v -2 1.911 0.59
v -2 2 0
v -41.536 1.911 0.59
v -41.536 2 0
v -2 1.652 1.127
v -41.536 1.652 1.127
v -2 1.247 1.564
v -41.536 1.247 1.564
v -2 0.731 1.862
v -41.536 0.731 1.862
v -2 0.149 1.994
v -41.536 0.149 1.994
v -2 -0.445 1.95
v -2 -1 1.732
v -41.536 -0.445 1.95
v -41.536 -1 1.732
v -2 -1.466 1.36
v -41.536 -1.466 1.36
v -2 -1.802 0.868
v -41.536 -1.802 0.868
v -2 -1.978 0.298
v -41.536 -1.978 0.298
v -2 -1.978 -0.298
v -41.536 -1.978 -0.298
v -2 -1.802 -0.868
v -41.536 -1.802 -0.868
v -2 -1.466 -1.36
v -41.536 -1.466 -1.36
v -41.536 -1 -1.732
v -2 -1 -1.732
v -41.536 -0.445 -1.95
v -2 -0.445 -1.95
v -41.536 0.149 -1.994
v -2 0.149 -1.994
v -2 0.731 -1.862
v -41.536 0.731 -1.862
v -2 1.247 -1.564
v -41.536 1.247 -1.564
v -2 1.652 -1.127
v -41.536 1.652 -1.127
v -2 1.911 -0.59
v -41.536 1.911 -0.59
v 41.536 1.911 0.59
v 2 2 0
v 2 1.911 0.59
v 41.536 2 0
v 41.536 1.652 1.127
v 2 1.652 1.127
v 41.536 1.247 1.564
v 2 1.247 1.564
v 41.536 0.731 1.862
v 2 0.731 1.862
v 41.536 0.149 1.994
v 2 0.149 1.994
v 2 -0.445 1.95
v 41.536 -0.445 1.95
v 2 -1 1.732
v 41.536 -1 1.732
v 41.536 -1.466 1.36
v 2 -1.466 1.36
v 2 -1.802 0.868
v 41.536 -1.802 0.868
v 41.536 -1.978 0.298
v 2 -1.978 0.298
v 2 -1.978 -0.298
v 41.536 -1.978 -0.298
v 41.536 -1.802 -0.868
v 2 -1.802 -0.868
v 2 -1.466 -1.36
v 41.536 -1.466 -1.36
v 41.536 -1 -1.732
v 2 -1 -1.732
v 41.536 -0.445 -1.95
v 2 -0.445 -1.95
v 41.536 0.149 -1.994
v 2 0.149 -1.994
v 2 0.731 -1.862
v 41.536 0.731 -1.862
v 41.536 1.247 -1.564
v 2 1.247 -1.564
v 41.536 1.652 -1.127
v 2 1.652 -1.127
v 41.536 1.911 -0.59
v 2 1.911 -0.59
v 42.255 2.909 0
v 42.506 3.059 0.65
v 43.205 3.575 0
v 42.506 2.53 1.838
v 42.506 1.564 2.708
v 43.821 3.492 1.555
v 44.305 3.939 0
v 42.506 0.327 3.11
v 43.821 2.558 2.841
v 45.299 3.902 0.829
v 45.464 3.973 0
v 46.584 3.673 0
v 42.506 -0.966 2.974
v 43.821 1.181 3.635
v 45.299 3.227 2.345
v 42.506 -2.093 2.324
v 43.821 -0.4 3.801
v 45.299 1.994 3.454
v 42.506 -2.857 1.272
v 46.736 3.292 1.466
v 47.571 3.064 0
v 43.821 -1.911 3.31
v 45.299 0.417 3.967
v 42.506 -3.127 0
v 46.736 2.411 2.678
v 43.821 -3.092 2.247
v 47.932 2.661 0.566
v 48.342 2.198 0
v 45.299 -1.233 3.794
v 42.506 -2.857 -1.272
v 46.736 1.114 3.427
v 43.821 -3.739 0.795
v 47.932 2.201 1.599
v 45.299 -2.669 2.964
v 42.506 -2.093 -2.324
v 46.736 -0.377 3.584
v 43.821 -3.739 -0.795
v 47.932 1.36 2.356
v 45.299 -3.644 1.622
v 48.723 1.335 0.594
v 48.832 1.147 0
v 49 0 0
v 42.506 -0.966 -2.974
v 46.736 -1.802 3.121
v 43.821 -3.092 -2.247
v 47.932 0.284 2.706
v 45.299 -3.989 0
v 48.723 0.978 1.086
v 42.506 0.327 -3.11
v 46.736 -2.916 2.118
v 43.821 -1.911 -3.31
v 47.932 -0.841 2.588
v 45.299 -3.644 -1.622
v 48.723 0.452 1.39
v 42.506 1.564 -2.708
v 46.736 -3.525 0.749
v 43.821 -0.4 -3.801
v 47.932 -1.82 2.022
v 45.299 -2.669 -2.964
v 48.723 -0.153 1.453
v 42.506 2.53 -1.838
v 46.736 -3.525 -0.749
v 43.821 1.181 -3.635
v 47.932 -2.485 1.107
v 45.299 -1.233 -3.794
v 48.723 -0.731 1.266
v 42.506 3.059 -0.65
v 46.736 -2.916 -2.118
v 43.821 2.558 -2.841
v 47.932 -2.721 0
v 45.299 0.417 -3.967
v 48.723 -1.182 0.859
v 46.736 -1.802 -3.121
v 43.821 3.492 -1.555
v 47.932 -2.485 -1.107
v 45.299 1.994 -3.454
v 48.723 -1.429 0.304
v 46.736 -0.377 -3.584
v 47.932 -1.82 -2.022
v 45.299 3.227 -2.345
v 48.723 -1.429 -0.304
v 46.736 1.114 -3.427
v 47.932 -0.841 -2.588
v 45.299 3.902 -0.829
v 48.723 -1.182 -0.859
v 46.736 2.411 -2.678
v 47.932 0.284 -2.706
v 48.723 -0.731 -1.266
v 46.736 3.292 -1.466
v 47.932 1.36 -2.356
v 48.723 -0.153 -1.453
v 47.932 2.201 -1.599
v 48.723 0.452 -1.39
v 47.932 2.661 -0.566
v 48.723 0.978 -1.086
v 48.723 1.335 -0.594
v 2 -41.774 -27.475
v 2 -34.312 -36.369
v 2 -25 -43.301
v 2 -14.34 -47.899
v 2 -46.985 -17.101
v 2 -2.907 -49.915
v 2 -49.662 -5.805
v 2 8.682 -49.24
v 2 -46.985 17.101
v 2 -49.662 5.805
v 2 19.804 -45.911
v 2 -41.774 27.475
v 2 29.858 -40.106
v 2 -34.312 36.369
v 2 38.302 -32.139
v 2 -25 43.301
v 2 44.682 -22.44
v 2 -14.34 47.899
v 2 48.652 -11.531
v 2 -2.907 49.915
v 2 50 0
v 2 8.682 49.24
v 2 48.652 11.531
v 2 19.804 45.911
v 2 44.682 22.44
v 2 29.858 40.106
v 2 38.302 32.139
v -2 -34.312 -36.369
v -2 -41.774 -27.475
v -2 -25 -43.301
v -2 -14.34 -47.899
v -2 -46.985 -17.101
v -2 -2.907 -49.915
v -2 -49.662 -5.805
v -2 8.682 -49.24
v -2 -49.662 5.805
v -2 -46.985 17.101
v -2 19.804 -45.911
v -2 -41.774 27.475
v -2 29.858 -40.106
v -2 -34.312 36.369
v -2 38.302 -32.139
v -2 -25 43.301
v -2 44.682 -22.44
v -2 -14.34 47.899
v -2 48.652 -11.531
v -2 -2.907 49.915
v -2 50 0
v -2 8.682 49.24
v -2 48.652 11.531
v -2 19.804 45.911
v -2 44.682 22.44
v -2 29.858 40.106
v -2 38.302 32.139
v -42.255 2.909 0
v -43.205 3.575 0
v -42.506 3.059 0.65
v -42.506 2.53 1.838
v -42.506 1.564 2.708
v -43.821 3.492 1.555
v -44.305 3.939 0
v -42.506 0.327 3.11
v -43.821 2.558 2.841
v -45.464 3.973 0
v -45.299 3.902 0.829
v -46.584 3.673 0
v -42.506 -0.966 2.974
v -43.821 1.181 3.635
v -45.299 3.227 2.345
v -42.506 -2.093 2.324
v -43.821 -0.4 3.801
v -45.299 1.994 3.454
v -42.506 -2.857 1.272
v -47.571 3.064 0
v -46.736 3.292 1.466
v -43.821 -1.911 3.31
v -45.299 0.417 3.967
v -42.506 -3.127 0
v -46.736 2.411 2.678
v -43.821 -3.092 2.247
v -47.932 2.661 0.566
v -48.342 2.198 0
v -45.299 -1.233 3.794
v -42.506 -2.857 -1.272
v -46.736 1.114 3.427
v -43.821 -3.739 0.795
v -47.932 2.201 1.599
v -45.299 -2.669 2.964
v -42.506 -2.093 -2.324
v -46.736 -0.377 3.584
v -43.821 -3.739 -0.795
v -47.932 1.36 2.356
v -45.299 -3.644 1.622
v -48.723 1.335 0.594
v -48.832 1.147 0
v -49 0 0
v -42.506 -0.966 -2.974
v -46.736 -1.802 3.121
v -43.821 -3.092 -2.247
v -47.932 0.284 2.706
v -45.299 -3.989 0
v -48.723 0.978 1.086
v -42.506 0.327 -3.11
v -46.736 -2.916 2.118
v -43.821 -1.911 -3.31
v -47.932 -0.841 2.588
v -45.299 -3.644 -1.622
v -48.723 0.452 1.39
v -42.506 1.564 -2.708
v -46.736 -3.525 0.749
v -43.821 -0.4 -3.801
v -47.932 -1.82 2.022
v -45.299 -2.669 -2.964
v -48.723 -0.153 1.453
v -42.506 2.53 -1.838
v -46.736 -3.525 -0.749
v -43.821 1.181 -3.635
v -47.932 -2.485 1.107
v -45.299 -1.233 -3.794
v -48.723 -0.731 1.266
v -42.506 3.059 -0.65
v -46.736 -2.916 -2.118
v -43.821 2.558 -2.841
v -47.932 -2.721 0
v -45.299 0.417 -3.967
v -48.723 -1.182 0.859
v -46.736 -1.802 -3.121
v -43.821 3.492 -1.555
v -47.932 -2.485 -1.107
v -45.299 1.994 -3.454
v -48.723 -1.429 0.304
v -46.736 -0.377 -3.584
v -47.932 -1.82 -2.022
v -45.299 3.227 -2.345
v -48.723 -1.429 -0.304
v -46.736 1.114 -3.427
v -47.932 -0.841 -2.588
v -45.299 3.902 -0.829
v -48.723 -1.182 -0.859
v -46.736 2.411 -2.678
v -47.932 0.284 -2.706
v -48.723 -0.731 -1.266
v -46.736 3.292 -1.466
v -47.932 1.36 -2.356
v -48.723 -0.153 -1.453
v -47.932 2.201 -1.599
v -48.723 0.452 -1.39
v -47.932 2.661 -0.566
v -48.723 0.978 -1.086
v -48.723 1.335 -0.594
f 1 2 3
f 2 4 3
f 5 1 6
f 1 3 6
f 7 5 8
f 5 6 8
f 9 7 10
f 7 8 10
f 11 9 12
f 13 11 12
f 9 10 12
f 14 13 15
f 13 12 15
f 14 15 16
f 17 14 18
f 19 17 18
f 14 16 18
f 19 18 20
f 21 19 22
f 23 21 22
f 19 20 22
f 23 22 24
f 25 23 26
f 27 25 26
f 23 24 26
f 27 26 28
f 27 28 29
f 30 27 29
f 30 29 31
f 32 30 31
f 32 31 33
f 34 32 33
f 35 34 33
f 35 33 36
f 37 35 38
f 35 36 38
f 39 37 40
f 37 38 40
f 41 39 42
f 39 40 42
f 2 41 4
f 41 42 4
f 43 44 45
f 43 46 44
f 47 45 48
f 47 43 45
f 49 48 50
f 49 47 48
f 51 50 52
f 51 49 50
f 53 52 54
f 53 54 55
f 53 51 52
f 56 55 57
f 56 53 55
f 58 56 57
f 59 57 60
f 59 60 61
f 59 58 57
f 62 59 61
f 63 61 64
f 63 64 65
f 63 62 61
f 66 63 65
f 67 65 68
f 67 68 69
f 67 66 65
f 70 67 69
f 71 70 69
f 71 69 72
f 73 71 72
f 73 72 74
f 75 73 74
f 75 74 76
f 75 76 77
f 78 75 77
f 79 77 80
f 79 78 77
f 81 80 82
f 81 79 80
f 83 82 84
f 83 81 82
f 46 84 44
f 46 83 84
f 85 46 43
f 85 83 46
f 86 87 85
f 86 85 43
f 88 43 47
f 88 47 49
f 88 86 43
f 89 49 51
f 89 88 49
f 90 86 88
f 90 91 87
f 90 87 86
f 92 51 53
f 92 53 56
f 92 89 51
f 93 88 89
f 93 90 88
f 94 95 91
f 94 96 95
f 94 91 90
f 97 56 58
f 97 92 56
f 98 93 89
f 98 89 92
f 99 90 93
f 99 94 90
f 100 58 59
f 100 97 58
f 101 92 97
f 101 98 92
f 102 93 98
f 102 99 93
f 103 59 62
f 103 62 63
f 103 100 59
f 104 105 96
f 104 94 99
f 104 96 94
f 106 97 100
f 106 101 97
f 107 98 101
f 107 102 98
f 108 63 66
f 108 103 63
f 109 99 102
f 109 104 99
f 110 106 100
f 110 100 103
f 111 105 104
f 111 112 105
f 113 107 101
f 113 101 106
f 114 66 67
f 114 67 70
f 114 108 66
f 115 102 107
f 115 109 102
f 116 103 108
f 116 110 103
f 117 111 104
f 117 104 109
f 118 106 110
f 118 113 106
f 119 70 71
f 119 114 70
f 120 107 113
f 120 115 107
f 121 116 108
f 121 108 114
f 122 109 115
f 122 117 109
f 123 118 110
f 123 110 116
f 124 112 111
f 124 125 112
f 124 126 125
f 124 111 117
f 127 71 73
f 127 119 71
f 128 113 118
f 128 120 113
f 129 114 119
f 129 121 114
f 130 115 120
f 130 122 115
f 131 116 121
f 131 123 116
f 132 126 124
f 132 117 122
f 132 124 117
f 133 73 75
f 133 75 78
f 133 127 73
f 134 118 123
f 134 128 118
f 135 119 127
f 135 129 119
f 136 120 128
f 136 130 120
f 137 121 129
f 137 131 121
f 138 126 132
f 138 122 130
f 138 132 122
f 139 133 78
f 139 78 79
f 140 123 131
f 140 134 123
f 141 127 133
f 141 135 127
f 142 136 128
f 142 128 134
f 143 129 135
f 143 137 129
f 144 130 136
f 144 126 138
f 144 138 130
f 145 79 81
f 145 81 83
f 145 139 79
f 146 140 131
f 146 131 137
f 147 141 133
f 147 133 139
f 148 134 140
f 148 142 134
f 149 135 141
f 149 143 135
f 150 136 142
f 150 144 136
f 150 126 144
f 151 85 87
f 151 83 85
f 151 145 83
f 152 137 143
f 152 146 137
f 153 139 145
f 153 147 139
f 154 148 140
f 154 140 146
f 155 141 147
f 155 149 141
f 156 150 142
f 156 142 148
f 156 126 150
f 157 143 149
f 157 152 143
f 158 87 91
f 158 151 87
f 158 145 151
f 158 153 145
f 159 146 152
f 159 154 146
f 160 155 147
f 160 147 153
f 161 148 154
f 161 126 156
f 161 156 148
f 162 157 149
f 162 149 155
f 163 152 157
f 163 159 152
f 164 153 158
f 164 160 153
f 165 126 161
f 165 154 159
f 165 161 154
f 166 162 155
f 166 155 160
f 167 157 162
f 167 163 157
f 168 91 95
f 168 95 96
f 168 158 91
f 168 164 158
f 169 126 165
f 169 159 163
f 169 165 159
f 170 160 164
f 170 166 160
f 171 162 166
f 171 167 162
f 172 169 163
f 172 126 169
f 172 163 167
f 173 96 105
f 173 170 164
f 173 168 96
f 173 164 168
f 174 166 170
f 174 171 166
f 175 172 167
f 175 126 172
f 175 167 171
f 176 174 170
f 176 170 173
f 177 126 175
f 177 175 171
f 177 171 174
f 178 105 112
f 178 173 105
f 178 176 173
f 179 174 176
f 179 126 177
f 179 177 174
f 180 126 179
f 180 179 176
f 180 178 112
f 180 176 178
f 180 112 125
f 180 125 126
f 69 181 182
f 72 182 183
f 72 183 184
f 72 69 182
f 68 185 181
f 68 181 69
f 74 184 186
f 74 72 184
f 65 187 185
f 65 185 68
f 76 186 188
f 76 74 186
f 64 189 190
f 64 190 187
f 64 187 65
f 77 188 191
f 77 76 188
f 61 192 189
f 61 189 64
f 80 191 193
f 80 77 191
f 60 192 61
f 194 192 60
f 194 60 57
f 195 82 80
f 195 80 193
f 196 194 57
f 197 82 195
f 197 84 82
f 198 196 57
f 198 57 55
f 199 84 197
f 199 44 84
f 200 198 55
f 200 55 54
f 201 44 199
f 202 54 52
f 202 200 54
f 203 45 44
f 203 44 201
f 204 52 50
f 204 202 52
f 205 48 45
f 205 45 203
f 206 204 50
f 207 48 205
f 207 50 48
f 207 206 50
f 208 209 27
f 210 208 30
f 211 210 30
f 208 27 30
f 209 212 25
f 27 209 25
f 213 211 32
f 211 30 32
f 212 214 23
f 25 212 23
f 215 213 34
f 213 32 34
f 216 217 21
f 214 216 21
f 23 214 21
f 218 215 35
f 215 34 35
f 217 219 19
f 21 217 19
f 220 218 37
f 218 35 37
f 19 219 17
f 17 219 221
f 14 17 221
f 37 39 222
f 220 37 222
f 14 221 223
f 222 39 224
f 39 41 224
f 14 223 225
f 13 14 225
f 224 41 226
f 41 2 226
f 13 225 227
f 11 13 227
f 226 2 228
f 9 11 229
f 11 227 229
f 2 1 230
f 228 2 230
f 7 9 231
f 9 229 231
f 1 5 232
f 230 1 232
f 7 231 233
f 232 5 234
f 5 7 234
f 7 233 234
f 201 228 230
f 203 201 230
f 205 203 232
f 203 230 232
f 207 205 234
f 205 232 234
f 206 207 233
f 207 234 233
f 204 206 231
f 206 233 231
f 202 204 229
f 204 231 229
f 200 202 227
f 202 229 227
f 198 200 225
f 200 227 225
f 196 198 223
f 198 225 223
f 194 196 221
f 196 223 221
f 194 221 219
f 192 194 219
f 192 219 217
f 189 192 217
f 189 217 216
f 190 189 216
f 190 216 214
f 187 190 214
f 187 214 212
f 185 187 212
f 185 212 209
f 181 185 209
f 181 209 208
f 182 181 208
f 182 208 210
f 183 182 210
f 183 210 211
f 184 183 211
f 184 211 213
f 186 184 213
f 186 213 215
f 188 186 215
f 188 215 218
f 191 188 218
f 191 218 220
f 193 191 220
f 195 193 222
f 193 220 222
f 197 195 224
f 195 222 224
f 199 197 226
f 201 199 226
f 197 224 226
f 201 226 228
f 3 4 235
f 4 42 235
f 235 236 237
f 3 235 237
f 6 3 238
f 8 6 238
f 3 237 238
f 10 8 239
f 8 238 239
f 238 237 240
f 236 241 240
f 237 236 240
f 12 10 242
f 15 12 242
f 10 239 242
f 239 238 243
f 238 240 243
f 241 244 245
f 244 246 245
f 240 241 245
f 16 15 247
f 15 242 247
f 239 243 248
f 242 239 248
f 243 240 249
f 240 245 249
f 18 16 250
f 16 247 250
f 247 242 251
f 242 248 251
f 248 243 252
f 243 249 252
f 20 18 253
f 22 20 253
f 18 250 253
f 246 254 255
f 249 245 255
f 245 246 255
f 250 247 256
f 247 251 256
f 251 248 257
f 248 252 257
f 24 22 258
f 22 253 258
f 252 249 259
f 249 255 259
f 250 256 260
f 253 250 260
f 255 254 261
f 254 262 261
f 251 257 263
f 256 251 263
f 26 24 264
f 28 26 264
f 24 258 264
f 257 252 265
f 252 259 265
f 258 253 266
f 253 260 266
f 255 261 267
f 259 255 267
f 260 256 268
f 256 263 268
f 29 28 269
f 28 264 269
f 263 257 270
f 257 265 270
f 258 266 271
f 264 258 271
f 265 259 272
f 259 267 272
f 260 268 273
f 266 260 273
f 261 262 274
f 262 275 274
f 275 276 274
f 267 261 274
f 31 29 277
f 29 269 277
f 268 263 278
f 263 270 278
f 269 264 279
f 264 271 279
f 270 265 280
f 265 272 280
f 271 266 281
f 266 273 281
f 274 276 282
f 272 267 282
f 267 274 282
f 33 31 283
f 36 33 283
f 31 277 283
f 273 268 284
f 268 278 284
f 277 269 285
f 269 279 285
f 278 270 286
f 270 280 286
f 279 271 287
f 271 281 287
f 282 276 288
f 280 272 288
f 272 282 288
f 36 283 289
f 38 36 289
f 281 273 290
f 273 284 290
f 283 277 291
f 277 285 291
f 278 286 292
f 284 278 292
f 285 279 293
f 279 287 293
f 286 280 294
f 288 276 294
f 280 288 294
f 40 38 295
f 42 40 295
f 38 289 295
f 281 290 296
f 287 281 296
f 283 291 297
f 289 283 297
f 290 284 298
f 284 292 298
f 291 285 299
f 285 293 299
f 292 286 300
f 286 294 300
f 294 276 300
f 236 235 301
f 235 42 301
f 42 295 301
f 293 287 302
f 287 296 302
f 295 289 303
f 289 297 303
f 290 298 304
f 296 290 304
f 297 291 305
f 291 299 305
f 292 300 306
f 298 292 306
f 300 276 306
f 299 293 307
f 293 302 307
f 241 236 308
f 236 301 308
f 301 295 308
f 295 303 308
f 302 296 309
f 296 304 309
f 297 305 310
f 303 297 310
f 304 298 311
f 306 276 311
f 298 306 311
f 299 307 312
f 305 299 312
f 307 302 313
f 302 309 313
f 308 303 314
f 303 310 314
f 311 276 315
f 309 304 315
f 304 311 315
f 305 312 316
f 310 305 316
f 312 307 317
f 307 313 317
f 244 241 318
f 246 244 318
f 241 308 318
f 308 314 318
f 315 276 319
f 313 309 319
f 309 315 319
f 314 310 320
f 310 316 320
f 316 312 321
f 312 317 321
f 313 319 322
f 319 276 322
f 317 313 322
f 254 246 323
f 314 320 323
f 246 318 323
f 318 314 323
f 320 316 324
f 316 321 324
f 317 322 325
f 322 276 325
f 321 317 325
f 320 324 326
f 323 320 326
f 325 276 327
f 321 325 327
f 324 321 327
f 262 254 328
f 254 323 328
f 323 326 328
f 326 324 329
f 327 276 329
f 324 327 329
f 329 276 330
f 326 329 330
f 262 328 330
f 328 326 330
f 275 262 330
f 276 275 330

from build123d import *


with BuildPart() as part:
    # Esquisse1 → Révolution1 (revolve)
    with BuildSketch(Plane.XY):
        with BuildLine():
            Line((0, 0), (0, 50))
            Line((0, 50), (2, 50))
            Line((2, 50), (2, 2))
            Line((2, 2), (41.535898385, 2))
            ThreePointArc((41.535898385, 2), (46.03527618, 3.863703305), (49, 0))
            Line((49, 0), (0, 0))
        make_face()
    r_volution1 = revolve(axis=Axis((0, 0, 0), (1, 0, 0)))

    # Symétrie1: Révolution1 across plane
    add(r_volution1.mirror(Plane(origin=(0, 0, 0), x_dir=(0, 0, 1), z_dir=(1, 0, 0))))


solid = part.part
